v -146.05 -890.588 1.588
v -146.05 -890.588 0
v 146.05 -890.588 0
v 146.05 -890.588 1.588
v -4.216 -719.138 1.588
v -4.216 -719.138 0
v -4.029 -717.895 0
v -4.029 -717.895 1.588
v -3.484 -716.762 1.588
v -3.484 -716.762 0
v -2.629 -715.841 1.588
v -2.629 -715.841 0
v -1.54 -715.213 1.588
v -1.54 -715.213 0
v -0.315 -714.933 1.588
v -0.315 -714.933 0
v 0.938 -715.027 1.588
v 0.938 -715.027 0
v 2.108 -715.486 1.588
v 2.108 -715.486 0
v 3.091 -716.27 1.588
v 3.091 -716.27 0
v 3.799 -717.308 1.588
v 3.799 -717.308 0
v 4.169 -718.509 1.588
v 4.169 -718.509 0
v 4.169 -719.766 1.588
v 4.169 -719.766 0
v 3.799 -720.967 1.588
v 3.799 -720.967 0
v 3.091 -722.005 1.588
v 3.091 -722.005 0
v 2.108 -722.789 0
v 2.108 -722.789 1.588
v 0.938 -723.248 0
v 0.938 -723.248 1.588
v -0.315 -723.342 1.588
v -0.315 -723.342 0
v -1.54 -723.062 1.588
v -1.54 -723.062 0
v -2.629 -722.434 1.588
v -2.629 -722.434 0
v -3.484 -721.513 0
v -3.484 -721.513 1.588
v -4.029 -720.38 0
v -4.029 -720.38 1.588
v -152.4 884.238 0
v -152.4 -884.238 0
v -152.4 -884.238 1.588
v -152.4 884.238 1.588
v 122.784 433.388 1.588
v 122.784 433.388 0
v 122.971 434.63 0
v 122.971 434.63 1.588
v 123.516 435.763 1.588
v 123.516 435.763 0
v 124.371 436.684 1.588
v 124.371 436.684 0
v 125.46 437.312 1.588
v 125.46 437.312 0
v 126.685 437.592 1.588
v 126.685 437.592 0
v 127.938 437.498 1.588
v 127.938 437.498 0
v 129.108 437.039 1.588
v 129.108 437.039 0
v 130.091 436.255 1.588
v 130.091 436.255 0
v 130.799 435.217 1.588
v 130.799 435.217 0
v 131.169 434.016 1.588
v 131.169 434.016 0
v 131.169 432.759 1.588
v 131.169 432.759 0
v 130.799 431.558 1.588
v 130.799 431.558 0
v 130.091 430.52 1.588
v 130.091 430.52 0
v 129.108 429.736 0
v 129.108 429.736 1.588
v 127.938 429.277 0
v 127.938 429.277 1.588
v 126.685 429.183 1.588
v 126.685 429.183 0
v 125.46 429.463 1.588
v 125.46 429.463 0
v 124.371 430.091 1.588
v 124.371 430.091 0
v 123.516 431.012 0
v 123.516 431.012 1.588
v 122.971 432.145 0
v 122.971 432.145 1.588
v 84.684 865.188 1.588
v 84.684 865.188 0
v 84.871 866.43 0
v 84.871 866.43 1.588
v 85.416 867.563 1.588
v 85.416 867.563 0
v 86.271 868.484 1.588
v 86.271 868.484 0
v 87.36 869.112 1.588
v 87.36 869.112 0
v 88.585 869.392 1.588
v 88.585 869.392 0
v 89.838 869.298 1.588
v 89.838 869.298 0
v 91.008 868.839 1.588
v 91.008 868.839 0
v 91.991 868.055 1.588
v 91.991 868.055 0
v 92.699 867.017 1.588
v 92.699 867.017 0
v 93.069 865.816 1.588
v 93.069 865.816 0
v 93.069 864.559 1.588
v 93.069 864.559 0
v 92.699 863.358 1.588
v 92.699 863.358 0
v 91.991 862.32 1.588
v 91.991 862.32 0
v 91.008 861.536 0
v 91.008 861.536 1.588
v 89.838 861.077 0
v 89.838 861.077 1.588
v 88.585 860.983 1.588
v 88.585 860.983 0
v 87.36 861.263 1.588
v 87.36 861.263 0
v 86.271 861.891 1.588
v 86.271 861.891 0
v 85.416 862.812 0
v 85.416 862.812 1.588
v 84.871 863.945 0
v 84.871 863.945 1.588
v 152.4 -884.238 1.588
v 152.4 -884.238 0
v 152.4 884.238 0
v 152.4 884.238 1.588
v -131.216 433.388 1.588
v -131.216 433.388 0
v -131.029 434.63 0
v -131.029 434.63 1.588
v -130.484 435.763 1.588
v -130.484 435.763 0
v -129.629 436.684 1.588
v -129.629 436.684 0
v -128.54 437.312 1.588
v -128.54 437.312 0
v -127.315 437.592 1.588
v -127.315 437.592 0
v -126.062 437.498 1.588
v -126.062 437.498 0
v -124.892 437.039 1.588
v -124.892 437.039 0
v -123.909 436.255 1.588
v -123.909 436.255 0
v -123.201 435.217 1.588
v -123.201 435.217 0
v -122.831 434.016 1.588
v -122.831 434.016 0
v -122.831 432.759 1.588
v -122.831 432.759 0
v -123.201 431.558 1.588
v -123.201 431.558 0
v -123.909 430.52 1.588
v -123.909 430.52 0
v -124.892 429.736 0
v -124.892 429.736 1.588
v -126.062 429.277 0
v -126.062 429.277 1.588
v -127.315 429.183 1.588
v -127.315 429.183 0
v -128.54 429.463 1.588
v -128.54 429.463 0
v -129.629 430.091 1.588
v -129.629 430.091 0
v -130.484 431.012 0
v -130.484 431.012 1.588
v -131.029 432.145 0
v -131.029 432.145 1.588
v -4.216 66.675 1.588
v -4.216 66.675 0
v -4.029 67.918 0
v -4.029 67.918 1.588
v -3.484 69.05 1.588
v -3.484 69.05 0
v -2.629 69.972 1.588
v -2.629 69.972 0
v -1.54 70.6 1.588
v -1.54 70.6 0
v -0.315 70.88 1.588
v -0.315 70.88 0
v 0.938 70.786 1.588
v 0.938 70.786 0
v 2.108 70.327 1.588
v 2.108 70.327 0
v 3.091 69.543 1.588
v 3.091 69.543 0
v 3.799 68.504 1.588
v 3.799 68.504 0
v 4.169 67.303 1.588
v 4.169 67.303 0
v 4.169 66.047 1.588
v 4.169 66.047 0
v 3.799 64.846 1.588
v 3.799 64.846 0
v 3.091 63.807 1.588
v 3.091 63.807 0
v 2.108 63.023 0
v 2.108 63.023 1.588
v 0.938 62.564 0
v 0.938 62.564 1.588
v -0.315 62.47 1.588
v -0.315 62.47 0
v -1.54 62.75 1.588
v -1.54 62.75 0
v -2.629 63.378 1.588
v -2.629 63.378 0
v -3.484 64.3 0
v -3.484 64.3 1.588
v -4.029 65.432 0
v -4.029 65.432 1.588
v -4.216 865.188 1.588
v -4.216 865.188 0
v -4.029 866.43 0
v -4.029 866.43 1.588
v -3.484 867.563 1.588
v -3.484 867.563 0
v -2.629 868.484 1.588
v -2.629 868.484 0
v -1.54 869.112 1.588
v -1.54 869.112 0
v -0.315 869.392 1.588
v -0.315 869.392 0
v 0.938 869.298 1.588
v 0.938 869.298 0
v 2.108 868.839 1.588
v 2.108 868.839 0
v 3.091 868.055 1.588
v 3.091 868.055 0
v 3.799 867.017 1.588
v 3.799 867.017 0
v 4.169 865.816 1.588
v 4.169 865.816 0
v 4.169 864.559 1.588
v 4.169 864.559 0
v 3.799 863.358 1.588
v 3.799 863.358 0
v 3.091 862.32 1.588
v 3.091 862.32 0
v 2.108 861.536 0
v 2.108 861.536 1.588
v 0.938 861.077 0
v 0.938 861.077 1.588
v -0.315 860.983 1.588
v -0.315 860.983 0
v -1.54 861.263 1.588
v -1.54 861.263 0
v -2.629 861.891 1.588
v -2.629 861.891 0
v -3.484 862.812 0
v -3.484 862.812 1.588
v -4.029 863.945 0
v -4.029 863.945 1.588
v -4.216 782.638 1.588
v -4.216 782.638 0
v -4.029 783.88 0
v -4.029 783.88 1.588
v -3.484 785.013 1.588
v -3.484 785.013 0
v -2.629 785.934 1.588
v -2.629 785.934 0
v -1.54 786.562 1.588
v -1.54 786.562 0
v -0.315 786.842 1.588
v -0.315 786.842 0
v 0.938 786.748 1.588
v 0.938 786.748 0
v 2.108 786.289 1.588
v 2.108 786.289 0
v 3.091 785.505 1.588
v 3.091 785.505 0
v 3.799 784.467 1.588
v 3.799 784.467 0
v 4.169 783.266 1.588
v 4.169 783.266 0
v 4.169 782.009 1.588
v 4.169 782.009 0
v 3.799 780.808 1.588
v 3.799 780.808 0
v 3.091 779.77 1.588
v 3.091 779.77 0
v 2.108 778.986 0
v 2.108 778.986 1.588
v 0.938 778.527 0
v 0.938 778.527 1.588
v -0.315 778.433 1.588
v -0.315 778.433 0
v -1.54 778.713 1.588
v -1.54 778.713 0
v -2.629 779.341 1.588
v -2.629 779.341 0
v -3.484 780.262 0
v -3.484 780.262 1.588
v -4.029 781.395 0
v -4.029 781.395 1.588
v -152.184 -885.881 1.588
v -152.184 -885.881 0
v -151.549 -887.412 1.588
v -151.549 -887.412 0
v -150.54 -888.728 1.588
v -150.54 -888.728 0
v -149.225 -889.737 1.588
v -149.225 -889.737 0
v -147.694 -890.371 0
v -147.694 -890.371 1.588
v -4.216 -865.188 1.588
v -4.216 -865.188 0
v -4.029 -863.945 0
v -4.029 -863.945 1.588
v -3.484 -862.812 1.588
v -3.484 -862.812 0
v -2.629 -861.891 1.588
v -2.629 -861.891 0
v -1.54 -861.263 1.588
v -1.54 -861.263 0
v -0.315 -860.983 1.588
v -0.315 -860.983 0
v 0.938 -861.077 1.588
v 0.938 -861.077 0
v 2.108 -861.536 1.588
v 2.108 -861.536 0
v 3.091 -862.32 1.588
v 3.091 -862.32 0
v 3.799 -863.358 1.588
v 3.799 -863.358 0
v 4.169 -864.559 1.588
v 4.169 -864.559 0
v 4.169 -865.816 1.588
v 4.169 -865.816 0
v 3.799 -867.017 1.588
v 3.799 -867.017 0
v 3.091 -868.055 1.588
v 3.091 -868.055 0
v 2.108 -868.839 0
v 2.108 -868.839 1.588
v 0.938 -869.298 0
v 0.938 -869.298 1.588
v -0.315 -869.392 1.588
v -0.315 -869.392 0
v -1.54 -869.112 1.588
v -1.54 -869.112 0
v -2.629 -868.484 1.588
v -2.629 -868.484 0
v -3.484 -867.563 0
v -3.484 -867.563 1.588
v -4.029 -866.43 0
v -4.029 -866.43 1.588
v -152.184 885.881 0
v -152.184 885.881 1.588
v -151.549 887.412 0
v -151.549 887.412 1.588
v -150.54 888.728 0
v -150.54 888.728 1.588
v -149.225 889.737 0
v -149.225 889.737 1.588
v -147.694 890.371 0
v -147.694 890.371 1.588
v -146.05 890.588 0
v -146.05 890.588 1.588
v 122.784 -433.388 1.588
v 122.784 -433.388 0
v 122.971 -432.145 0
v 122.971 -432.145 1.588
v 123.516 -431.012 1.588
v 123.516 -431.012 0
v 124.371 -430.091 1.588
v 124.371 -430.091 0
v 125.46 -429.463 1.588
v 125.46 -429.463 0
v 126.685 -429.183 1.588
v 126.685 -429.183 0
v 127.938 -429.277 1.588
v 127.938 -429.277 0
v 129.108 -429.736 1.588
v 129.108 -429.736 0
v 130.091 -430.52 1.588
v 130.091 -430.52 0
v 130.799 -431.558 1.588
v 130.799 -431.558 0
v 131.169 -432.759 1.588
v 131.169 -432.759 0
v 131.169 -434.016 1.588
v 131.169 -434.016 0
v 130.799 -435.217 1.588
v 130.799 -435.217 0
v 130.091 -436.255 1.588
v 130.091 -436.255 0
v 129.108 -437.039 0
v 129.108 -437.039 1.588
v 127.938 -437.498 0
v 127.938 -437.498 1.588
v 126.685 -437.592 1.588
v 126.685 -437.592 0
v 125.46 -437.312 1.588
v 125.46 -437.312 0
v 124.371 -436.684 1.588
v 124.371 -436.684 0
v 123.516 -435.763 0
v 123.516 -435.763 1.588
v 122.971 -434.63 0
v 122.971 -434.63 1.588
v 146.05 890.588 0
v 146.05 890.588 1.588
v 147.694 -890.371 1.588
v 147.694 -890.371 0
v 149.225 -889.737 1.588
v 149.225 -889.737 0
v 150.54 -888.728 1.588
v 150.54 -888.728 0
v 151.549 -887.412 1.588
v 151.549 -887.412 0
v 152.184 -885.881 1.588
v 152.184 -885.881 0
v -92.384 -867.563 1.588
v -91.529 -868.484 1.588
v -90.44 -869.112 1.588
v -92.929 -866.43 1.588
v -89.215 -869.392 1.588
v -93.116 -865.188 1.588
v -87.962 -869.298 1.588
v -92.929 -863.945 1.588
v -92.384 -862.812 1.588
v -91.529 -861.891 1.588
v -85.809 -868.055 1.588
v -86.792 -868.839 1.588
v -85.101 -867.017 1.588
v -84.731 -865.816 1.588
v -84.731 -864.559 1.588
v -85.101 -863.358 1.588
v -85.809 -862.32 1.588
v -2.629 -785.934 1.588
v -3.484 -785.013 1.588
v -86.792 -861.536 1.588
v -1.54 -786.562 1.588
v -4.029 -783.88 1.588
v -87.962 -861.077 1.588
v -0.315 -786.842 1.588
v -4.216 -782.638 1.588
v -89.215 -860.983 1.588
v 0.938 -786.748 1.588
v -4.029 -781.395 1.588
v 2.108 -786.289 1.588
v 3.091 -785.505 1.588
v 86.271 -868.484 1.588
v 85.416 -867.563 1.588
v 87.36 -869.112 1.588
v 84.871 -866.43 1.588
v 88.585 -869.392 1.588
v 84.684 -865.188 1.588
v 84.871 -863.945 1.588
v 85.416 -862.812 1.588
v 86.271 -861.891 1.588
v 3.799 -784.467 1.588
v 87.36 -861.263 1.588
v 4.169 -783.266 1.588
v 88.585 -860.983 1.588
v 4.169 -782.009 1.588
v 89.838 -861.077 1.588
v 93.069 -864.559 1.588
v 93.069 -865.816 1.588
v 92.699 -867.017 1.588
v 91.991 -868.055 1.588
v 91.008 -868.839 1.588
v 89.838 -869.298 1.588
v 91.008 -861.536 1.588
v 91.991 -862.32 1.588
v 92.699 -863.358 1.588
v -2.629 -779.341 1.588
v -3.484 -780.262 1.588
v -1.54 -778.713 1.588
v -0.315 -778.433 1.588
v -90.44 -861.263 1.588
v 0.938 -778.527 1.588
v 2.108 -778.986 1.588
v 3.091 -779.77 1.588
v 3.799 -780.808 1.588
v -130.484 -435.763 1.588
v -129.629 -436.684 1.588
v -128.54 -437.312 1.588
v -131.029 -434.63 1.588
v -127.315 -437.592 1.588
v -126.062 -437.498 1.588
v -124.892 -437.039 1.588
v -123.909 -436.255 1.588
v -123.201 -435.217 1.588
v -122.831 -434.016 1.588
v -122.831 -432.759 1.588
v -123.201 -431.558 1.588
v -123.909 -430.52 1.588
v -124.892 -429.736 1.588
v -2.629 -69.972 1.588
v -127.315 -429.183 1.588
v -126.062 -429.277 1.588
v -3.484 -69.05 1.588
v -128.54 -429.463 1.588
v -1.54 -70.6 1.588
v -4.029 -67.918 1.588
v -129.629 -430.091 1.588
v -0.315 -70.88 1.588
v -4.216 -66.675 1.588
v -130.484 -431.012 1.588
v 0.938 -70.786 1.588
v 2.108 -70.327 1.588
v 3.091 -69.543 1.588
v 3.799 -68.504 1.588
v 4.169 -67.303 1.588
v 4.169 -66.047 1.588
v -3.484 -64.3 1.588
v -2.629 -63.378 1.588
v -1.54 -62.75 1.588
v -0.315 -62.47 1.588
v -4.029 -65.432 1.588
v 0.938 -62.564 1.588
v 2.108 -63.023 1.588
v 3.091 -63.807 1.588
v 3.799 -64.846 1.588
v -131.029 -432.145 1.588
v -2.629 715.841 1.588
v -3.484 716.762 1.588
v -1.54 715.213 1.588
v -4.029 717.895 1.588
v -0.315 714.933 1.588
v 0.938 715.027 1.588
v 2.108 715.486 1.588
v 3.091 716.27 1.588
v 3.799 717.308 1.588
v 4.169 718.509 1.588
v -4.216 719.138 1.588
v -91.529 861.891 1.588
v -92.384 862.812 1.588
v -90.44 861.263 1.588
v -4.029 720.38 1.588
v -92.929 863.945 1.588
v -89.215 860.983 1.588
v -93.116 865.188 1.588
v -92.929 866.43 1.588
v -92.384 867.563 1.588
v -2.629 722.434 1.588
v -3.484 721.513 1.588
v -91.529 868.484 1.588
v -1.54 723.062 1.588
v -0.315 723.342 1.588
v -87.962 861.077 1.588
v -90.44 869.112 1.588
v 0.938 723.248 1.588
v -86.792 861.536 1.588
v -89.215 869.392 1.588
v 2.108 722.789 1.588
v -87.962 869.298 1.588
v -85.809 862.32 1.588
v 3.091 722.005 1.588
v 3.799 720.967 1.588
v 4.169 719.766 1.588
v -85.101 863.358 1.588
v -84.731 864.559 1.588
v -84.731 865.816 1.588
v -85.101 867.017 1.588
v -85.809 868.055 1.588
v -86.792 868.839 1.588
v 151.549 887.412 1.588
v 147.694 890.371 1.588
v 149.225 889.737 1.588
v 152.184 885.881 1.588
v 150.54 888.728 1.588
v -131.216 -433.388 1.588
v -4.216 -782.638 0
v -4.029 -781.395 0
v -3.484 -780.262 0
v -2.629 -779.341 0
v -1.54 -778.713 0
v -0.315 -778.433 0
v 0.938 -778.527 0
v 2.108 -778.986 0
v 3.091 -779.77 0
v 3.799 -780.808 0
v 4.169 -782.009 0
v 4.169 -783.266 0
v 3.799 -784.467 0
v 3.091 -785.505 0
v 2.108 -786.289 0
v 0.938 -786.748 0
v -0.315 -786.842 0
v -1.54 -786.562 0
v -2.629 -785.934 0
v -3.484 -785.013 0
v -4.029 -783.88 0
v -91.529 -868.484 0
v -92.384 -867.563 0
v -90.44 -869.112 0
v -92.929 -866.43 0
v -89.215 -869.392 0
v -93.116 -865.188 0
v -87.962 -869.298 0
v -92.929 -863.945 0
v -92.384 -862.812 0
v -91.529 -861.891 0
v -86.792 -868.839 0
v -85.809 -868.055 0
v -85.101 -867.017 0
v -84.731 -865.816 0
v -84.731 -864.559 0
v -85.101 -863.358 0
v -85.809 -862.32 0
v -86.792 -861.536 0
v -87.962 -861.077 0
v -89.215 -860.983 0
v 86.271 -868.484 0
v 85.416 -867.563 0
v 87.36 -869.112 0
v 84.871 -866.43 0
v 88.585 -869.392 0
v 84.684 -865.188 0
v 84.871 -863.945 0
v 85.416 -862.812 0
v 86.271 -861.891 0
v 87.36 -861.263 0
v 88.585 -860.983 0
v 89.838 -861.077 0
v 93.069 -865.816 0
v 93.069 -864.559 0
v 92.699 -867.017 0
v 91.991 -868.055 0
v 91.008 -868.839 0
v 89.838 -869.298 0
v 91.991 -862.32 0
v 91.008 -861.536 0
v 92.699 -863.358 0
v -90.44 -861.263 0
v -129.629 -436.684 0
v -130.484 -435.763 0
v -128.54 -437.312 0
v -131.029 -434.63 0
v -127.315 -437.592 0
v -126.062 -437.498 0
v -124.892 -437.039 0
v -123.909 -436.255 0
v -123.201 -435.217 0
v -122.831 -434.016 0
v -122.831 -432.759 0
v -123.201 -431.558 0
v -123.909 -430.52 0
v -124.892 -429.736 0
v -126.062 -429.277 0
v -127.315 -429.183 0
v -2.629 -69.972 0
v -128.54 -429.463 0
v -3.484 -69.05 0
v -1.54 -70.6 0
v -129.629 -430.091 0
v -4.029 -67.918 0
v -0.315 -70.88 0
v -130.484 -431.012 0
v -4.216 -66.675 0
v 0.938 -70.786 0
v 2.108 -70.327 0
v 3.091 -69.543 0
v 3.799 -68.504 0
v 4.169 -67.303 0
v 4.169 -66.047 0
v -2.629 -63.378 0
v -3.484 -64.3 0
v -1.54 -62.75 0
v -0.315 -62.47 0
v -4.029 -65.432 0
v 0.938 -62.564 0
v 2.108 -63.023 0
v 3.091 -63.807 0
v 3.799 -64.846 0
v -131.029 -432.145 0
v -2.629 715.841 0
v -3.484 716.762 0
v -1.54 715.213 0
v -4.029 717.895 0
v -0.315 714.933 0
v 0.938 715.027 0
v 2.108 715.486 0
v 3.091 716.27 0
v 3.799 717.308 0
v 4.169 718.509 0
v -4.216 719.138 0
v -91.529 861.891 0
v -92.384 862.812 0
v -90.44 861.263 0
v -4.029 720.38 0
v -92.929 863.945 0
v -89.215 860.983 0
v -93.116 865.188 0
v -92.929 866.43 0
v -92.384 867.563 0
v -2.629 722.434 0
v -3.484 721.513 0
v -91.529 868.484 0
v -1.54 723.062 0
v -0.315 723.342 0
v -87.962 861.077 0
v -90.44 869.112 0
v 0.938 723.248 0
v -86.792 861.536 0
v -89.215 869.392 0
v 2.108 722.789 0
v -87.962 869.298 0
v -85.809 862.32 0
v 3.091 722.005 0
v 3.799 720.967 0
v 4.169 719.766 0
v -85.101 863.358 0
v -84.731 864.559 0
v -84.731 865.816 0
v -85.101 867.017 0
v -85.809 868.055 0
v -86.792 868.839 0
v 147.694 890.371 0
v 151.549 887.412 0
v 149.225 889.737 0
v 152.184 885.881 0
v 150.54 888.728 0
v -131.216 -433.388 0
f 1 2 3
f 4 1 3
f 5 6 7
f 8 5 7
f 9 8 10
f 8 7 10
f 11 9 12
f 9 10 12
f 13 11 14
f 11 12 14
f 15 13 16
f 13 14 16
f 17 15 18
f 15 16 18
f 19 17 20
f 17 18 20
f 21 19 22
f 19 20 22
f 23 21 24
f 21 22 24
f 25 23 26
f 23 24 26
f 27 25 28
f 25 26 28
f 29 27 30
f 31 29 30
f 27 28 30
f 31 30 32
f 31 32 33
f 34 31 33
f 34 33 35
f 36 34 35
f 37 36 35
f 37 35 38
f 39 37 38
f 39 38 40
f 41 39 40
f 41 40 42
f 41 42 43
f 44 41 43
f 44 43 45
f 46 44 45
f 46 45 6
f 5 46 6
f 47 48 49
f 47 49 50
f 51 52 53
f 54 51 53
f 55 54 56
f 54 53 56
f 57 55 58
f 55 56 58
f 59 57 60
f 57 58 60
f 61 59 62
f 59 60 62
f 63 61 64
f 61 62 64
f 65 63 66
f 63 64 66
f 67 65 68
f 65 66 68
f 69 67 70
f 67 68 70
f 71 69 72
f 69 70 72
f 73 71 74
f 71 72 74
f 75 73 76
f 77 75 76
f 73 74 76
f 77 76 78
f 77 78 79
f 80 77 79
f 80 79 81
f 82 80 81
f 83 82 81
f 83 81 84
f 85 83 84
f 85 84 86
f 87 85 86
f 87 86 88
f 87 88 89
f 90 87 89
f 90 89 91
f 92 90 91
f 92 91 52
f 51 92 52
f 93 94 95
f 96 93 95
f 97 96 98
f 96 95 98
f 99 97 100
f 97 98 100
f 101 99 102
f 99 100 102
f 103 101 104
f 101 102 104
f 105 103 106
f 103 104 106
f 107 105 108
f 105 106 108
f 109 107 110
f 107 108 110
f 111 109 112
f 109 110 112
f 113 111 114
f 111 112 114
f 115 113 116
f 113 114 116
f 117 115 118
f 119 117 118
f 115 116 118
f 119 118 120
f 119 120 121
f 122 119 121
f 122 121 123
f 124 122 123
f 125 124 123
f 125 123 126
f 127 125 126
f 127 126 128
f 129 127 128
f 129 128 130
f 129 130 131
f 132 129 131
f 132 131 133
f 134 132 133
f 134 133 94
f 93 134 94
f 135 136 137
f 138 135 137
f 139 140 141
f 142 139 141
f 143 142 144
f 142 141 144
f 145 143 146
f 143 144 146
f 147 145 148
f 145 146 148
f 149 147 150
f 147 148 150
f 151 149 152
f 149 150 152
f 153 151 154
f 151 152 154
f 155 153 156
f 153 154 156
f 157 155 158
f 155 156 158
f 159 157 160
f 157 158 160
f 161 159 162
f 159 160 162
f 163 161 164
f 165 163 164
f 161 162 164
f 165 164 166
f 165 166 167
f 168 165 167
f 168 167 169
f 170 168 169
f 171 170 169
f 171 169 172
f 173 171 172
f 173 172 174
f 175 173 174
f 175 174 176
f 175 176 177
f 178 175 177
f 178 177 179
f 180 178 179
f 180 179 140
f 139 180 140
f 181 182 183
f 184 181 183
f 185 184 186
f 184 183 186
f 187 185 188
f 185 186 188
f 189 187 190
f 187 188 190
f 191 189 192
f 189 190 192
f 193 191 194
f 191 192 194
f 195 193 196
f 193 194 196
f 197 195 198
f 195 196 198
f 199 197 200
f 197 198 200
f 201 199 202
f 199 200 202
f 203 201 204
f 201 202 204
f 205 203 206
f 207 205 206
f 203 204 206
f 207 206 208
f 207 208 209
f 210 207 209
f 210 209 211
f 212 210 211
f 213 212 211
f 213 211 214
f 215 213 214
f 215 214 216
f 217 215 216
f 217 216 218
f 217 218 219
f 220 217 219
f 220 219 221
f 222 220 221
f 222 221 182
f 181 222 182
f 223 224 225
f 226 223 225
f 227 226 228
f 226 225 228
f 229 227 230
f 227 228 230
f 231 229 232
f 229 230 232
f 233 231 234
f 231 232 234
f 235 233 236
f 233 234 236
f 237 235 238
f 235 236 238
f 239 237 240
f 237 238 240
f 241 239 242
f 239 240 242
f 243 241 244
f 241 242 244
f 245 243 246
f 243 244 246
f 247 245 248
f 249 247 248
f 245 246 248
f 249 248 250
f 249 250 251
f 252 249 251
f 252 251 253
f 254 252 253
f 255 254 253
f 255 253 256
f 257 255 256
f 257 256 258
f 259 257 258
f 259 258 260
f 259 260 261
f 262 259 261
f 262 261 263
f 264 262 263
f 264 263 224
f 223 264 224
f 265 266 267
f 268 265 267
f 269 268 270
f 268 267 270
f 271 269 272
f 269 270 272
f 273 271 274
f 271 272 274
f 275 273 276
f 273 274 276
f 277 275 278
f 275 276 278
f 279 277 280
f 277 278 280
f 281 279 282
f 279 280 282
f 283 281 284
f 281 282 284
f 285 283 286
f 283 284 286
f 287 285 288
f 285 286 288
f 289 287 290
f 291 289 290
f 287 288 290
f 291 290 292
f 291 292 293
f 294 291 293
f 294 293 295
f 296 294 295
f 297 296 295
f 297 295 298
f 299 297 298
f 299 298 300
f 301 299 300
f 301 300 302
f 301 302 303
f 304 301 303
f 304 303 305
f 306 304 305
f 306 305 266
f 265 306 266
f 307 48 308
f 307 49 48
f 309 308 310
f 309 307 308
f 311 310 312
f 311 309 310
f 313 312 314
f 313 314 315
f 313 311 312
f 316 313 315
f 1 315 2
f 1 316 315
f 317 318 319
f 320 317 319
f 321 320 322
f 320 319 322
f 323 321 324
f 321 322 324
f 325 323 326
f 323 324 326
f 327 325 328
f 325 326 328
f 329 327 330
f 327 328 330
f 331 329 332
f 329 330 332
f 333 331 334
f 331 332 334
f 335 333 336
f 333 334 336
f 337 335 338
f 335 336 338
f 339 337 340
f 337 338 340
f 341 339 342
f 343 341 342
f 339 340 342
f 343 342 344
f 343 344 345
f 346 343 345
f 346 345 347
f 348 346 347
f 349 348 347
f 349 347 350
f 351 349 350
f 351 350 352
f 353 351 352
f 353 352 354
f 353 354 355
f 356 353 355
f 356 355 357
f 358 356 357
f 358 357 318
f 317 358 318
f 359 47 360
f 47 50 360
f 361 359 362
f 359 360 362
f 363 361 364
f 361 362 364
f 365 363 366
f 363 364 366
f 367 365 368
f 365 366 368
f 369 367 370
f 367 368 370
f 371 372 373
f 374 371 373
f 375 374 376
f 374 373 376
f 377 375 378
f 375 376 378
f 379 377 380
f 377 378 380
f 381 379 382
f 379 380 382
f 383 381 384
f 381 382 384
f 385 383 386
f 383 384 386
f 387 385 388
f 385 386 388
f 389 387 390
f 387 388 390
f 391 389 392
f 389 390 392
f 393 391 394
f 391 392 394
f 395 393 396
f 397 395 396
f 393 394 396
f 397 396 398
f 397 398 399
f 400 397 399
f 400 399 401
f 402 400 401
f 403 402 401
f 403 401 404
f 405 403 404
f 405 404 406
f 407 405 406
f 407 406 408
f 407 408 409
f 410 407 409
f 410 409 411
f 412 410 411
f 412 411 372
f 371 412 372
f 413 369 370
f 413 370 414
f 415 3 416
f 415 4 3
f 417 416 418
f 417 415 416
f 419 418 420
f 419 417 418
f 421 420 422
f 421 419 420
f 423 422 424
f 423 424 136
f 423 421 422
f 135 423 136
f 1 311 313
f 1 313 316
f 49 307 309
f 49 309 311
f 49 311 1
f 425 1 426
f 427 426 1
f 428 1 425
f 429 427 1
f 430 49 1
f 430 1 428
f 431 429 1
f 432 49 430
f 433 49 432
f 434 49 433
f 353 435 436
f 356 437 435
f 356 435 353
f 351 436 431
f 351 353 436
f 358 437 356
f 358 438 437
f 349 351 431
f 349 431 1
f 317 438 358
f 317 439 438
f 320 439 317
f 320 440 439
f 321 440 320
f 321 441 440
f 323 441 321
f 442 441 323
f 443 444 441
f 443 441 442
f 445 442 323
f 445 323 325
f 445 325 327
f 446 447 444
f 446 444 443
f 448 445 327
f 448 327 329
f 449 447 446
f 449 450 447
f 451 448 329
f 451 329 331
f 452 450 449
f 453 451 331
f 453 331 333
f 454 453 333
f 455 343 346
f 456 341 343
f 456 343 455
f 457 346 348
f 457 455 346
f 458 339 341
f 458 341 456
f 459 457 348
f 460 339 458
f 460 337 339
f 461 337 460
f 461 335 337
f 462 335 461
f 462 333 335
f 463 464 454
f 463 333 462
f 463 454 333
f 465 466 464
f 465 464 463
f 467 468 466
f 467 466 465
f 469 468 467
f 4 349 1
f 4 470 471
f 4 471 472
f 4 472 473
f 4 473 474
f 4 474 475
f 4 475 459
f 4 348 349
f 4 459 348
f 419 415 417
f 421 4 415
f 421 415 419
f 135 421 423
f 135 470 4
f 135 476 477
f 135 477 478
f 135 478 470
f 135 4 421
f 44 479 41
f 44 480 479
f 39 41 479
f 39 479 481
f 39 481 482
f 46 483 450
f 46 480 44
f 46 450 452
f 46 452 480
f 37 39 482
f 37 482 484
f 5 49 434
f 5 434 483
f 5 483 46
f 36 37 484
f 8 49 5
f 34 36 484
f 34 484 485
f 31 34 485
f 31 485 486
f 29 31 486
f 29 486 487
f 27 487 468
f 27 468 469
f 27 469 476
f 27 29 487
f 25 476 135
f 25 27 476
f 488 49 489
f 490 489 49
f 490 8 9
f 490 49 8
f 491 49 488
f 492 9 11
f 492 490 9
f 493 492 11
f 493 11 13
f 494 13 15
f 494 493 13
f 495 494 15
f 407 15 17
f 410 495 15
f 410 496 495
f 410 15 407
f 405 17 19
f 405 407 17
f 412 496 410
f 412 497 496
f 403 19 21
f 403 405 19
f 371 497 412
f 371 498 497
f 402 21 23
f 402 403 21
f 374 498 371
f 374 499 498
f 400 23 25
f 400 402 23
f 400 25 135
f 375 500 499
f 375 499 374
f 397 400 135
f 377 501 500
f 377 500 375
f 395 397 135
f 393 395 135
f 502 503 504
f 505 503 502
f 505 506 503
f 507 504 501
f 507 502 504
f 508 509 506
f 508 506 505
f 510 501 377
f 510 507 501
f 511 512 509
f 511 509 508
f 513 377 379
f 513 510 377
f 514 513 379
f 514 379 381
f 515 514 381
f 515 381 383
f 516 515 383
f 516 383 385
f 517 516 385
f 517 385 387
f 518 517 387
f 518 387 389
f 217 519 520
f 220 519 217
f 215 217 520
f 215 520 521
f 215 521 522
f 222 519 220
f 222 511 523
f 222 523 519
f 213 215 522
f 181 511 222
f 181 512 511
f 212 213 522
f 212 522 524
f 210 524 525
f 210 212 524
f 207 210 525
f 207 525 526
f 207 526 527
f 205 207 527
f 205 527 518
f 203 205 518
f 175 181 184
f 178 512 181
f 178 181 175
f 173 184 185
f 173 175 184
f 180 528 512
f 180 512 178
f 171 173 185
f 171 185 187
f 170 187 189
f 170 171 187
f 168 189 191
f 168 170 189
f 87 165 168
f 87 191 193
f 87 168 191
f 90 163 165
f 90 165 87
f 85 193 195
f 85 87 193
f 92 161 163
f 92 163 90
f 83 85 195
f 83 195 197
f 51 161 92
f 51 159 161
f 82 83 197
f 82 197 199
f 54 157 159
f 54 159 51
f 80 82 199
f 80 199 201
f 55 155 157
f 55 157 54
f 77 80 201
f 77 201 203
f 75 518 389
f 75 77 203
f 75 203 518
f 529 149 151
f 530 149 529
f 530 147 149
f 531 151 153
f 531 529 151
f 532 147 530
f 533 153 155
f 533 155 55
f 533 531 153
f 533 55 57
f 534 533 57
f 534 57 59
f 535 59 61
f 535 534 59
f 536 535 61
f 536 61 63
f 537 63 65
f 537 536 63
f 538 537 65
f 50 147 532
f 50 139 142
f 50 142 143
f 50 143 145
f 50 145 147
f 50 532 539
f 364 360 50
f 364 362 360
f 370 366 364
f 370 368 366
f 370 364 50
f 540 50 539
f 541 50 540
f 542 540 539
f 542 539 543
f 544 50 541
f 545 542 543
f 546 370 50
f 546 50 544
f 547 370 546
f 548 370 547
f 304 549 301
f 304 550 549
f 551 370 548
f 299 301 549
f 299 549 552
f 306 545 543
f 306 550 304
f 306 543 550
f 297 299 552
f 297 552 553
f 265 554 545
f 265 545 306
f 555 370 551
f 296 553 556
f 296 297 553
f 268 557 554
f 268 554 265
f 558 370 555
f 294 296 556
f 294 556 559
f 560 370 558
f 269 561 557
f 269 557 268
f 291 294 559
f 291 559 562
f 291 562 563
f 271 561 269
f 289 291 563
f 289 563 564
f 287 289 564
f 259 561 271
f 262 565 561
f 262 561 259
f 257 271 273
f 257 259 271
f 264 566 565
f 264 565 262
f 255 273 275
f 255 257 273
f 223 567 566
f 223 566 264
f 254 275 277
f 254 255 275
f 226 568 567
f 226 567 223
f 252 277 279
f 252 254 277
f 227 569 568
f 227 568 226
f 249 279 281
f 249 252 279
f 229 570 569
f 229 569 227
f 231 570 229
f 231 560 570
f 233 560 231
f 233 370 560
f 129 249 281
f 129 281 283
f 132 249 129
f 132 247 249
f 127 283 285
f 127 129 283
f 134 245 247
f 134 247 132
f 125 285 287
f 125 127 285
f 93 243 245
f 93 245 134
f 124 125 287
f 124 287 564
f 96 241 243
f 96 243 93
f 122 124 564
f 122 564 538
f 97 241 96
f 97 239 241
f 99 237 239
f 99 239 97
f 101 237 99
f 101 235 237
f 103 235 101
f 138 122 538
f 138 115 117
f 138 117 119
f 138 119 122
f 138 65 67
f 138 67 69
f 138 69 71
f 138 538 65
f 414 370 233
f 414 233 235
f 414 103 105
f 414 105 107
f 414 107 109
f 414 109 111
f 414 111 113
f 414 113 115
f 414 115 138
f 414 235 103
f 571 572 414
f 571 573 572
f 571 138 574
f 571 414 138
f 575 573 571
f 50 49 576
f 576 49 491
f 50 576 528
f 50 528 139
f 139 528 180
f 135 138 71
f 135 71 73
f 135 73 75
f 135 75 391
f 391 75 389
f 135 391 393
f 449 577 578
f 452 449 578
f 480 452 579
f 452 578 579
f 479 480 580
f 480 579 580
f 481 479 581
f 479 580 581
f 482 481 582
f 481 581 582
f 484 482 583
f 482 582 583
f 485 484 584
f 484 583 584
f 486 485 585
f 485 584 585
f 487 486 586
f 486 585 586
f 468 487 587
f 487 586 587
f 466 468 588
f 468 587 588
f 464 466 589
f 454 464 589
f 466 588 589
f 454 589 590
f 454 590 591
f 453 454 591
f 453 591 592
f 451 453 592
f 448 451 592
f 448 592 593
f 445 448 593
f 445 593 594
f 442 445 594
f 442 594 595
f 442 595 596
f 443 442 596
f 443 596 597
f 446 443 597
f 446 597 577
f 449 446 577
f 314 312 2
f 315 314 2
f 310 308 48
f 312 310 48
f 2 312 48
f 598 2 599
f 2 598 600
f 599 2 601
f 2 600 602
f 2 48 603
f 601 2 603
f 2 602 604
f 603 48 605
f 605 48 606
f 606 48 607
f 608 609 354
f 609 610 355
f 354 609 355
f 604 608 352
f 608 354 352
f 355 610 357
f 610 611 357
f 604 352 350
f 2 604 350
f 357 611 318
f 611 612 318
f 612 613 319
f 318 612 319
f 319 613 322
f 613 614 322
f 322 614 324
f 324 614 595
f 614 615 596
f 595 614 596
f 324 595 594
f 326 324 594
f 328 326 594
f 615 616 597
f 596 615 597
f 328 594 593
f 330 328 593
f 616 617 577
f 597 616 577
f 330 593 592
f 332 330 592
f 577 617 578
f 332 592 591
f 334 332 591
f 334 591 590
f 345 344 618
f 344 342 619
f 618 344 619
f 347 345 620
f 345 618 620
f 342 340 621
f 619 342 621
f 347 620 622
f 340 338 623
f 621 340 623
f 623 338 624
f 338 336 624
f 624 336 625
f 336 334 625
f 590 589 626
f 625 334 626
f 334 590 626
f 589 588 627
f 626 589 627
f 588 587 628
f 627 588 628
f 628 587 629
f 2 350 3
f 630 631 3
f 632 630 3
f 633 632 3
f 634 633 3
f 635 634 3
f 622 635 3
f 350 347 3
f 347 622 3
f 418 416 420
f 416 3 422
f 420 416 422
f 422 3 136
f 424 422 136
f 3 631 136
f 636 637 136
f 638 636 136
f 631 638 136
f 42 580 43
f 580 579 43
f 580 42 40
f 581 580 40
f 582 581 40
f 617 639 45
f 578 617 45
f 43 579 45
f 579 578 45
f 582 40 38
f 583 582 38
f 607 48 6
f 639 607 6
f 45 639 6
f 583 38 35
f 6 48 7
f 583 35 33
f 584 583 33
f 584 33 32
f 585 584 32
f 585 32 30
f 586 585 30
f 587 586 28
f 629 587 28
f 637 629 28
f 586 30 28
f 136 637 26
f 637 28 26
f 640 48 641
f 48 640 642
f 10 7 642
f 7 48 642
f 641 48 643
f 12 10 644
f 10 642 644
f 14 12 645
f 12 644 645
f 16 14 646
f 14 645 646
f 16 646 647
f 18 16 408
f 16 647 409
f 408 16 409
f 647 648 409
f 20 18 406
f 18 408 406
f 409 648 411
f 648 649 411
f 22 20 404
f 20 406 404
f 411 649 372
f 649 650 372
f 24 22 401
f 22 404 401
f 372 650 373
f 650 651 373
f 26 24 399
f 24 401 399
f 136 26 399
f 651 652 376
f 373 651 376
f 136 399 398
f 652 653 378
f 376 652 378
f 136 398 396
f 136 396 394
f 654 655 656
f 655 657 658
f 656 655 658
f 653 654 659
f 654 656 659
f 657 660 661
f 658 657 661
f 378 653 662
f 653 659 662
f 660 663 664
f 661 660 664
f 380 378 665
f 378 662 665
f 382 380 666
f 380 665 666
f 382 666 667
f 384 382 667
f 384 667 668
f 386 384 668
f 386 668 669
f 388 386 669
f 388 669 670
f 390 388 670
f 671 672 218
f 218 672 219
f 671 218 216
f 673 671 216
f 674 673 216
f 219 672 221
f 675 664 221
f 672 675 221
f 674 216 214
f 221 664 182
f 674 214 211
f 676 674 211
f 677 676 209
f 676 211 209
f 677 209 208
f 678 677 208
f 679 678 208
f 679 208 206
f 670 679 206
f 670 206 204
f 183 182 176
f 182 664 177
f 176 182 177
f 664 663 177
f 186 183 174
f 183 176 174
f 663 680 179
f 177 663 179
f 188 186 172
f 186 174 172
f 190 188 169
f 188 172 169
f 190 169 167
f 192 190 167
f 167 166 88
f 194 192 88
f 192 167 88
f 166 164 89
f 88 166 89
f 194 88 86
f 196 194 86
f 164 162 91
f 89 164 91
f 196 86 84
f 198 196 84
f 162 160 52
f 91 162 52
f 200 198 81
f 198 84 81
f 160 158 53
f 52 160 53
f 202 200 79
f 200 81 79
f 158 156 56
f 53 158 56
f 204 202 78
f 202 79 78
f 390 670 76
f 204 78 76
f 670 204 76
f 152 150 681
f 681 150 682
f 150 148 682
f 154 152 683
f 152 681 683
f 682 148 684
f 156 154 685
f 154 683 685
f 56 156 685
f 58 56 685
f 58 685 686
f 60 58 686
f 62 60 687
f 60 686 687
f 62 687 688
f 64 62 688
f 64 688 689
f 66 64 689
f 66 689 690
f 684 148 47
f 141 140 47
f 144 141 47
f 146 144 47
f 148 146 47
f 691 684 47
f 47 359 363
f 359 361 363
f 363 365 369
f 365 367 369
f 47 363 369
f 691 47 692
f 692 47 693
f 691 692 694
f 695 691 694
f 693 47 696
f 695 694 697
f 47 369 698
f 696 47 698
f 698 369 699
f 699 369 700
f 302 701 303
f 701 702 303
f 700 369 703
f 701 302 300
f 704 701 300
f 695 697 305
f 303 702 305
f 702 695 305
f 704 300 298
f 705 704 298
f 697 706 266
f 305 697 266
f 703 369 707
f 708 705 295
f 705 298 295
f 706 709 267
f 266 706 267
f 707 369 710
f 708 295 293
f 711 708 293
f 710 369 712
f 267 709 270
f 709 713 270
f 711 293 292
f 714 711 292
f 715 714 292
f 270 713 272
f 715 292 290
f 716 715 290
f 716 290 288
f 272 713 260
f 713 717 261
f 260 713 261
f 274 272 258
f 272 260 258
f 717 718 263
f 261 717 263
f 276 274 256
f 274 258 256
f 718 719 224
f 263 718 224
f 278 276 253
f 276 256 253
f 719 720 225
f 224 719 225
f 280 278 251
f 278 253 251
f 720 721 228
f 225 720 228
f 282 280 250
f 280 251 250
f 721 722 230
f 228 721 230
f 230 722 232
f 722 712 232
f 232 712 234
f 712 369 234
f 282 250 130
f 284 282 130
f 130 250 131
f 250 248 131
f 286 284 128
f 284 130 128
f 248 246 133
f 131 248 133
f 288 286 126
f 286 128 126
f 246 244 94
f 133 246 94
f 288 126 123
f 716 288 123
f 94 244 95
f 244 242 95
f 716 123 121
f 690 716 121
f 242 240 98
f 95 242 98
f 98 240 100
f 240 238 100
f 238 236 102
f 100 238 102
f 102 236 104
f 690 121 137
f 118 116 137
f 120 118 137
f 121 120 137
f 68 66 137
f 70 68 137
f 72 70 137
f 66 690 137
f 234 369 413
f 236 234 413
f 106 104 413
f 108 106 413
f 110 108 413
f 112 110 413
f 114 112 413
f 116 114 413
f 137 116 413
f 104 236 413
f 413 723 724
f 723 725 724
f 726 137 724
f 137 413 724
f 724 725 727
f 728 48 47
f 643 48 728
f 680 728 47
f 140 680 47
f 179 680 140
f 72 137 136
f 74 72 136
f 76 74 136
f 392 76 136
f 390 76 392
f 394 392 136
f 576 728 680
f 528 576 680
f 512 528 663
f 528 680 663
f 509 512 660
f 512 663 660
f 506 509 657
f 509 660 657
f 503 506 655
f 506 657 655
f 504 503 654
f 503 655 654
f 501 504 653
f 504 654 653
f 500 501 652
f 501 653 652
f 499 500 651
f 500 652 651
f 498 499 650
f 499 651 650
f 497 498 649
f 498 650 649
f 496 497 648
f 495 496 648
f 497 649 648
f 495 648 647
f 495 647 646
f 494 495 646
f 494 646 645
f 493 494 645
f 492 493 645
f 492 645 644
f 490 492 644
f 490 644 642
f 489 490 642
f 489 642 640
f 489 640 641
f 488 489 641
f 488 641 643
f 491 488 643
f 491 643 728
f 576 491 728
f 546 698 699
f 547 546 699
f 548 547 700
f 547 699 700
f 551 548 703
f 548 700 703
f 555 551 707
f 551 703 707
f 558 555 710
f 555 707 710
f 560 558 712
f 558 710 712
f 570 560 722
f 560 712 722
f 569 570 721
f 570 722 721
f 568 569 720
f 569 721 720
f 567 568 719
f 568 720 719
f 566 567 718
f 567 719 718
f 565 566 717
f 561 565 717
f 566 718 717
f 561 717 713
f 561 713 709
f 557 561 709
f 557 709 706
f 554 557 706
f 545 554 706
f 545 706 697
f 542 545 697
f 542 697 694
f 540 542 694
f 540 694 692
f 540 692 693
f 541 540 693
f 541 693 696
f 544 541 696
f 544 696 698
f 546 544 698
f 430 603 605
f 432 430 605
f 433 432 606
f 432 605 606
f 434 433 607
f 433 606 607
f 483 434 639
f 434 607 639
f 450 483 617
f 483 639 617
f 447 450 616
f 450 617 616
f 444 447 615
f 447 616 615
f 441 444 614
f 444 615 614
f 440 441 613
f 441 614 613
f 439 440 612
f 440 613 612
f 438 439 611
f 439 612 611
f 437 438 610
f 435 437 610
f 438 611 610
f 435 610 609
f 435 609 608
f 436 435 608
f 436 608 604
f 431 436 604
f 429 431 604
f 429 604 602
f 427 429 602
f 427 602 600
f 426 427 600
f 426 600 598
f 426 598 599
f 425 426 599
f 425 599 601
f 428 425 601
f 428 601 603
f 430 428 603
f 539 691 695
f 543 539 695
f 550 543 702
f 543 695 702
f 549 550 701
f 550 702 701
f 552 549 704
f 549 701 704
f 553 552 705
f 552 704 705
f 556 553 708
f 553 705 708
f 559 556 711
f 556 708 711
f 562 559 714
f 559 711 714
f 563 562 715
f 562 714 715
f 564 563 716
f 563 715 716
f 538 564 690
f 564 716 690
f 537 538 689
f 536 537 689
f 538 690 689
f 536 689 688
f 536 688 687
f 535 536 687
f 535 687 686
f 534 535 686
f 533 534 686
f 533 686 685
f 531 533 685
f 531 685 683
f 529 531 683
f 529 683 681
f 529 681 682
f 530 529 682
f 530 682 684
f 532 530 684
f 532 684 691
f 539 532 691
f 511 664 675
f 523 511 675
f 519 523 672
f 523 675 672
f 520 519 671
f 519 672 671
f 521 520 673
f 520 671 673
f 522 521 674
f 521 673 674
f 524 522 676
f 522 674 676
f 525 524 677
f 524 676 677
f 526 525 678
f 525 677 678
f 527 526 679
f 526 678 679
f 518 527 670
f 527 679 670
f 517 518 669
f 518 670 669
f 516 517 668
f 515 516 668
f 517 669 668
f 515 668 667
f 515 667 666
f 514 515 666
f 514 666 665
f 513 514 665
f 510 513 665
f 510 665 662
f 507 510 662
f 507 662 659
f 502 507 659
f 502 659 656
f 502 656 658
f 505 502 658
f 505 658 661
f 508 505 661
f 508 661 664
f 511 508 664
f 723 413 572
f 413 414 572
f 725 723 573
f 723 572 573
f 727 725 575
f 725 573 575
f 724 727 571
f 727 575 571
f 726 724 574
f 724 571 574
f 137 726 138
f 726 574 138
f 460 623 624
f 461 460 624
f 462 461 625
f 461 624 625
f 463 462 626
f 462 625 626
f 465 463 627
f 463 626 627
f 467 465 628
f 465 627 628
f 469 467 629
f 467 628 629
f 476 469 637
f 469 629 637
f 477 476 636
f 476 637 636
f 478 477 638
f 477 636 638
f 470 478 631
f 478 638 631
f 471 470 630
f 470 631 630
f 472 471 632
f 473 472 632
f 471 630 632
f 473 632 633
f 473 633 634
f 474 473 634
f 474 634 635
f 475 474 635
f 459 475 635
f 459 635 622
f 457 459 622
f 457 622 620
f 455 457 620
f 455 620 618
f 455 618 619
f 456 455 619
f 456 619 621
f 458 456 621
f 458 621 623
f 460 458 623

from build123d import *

# Parameters (mm, degrees)
SKETCH1_W                    = 304.8
SKETCH1_H                    = 1781.175
BOSS_EXTRUDE1_DEPTH          = 1.5875
F_5_16_CLEARANCE_HOLE1_D     = 8.4328
F_5_16_CLEARANCE_HOLE1_DEPTH = 1.5875
FILLET4_R                    = 6.35


with BuildPart() as part:
    # Sketch1 → Boss-Extrude1 (new body)
    with BuildSketch(Plane.XY):
        Rectangle(SKETCH1_W, SKETCH1_H)
    extrude(amount=BOSS_EXTRUDE1_DEPTH)

    # 5/16 Clearance Hole1
    with Locations(Plane.XY.offset(1.5875)):
        with Locations((0, 865.1875), (-127, 433.3875), (127, 433.3875), (0, 66.675), (0, -66.675), (-127, -433.3875), (127, -433.3875), (0, -865.1875), (0, 782.6375), (0, 719.1375), (0, -782.6375), (0, -719.1375), (-88.9, 865.1875), (88.9, 865.1875), (-88.9, -865.1875), (88.9, -865.1875)):
            Hole(F_5_16_CLEARANCE_HOLE1_D / 2, depth=F_5_16_CLEARANCE_HOLE1_DEPTH)

    # Fillet4
    fillet4_edges = [part.edges().sort_by_distance(p)[0] for p in [
        (152.4, -890.5875, 0.79375),
        (-152.4, -890.5875, 0.79375),
        (-152.4, 890.5875, 0.79375),
        (152.4, 890.5875, 0.79375),
    ]]
    fillet(fillet4_edges, radius=FILLET4_R)


solid = part.part
